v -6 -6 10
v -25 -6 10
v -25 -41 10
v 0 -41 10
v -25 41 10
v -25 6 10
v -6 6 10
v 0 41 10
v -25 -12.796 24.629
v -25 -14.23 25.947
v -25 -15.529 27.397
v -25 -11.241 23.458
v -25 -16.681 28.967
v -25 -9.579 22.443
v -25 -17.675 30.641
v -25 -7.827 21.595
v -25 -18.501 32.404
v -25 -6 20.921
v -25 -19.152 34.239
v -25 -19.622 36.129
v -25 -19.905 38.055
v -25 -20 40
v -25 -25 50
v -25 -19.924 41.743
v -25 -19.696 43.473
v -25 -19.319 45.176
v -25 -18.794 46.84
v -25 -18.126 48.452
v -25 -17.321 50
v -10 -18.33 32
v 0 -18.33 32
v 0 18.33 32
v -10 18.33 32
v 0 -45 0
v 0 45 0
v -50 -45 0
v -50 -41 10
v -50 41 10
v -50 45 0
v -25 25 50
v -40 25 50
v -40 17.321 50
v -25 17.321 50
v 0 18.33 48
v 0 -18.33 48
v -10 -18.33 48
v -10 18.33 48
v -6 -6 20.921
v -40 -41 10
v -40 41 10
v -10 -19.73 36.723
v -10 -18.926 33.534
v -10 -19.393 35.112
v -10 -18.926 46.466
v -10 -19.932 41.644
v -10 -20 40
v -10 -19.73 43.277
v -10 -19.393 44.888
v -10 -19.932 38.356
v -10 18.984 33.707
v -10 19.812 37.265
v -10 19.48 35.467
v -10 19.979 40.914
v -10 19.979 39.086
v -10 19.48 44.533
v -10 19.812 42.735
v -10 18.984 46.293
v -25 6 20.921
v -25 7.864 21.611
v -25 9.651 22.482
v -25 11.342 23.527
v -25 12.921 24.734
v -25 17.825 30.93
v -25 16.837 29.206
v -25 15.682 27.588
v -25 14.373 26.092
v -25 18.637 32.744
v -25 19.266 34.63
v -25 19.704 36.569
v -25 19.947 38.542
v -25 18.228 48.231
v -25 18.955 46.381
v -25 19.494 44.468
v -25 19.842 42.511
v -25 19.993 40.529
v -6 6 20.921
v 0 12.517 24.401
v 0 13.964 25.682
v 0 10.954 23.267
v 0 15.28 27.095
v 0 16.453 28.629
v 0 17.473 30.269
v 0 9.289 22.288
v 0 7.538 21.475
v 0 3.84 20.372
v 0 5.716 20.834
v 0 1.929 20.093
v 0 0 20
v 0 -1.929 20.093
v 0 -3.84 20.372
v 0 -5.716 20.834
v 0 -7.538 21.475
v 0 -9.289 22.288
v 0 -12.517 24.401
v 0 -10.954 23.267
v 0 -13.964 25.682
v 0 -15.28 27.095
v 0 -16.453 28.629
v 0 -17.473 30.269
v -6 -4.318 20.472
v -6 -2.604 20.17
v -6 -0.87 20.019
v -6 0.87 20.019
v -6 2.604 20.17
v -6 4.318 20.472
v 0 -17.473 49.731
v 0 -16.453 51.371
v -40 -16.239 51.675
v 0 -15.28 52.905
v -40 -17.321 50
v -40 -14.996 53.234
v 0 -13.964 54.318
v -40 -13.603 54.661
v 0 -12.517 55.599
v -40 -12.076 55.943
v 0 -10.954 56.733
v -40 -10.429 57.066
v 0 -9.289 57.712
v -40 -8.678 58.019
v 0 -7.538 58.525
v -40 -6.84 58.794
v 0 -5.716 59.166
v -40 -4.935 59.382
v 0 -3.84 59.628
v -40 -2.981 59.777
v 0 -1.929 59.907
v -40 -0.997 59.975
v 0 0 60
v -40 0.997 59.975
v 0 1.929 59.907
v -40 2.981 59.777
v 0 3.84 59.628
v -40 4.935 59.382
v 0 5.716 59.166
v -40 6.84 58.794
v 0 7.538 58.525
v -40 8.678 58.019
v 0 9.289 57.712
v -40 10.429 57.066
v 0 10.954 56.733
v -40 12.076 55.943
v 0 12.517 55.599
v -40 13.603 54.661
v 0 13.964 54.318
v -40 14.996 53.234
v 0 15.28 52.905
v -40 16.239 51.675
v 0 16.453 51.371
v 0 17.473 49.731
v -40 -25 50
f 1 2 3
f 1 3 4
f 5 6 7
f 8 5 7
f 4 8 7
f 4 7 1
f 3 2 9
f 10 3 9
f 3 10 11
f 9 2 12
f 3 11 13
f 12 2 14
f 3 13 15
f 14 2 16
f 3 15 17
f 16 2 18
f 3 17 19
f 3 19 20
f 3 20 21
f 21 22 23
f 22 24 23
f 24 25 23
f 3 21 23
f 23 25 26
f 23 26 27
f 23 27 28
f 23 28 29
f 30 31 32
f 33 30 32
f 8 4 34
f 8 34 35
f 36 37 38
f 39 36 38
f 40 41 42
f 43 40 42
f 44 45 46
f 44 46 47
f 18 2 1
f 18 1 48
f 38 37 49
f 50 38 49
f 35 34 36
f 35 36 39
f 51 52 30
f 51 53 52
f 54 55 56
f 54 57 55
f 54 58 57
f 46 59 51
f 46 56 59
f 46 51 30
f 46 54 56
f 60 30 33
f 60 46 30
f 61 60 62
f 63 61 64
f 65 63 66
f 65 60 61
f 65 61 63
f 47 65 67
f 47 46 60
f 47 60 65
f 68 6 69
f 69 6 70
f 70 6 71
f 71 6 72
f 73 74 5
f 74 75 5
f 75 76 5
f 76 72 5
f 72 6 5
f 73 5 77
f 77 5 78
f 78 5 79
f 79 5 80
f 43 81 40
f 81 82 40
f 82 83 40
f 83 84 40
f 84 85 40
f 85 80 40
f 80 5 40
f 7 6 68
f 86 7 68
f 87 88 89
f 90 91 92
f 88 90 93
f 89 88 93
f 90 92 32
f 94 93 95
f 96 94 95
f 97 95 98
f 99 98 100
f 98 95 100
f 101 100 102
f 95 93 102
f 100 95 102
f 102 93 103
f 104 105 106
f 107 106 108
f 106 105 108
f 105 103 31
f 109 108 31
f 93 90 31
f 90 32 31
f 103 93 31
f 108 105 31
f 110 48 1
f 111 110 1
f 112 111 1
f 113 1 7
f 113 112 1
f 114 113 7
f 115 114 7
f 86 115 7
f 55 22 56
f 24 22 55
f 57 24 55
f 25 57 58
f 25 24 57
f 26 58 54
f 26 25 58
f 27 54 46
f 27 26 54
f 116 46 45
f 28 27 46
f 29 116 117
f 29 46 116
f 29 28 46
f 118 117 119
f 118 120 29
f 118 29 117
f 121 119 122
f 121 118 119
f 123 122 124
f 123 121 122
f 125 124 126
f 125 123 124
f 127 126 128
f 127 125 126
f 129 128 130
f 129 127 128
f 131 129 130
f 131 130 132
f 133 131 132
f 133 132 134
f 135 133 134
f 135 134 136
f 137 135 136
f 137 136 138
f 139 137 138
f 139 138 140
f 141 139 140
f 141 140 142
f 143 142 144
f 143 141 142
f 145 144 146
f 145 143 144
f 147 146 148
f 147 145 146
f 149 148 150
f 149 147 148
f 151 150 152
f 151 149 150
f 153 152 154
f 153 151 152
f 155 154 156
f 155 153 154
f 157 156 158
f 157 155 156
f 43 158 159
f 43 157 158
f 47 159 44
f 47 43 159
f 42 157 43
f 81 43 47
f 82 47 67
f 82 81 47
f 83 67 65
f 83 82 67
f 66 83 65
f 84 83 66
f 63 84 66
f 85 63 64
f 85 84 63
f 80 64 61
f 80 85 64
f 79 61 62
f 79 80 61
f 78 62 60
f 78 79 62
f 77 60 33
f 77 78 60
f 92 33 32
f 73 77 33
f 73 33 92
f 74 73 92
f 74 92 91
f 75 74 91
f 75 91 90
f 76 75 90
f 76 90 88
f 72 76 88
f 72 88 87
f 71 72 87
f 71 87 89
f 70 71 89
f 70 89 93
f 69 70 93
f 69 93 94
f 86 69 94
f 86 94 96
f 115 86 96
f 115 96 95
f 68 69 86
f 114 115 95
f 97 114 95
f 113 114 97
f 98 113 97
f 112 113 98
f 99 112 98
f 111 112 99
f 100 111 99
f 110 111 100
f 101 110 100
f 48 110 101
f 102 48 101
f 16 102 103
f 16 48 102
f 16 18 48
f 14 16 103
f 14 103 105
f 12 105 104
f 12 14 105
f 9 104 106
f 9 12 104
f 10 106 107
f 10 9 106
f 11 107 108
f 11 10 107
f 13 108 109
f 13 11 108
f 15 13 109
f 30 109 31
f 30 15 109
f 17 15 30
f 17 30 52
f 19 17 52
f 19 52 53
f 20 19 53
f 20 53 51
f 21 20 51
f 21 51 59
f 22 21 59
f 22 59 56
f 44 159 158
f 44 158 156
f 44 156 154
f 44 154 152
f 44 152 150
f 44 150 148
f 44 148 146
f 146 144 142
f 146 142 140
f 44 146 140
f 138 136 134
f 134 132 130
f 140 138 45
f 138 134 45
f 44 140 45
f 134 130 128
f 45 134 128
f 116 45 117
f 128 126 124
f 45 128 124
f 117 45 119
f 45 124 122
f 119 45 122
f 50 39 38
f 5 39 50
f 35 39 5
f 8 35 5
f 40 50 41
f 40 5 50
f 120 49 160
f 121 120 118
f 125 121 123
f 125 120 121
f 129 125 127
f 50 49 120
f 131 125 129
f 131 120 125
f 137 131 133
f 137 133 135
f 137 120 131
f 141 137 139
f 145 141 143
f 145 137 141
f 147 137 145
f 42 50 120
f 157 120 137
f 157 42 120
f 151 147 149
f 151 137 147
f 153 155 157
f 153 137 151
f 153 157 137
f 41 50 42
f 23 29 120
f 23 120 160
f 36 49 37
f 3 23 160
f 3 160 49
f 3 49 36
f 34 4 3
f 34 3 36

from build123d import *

# Parameters (mm, degrees)
F1_DEPTH      = 50
F2_W          = 25
F2_H          = 40
F2_W_2        = 10
F3_DEPTH      = 45.001
F3_DEPTH_BACK = 45.001
F4_R          = 20
F5_DEPTH      = 40
F6_W          = 12
F6_H          = 12
F7_DEPTH      = 19
F8_W          = 40
F8_H          = 16
F9_DEPTH      = 10


with BuildPart() as f1:
    # F0 (on Right) → F1 (new body)
    with BuildSketch(Plane.YZ):
        Polygon((-45, 0), (0, 0), (45, 0), (25, 50), (0, 50), (-25, 50), align=None)
    extrude(amount=-F1_DEPTH)

    # F2 (on Front) → F3 (cut, two sides)
    with BuildSketch(Plane.XZ) as f3_sk:
        with Locations((-12.5, 30)):
            Rectangle(F2_W, F2_H)
        with Locations((-45, 30)):
            Rectangle(F2_W_2, F2_H)
    extrude(amount=-F3_DEPTH, mode=Mode.SUBTRACT)
    extrude(f3_sk.sketch, amount=F3_DEPTH_BACK, mode=Mode.SUBTRACT)

    # F4 (on face) → F5 (join)
    with BuildSketch(Plane(origin=(-40, 0, 0), x_dir=(0, -1, 0), z_dir=(-1, 0, 0))):
        with Locations((0, 40)):
            Circle(F4_R)
    extrude(amount=-F5_DEPTH)

    # F6 (on face) → F7 (join)
    with BuildSketch(Plane.YZ.offset(-25)):
        with Locations((0, 16)):
            Rectangle(F6_W, F6_H)
    extrude(amount=F7_DEPTH)

    # F8 (on face) → F9 (cut)
    with BuildSketch(Plane.YZ):
        with Locations((0, 40)):
            Rectangle(F8_W, F8_H)
    extrude(amount=-F9_DEPTH, mode=Mode.SUBTRACT)


solid = f1.part
